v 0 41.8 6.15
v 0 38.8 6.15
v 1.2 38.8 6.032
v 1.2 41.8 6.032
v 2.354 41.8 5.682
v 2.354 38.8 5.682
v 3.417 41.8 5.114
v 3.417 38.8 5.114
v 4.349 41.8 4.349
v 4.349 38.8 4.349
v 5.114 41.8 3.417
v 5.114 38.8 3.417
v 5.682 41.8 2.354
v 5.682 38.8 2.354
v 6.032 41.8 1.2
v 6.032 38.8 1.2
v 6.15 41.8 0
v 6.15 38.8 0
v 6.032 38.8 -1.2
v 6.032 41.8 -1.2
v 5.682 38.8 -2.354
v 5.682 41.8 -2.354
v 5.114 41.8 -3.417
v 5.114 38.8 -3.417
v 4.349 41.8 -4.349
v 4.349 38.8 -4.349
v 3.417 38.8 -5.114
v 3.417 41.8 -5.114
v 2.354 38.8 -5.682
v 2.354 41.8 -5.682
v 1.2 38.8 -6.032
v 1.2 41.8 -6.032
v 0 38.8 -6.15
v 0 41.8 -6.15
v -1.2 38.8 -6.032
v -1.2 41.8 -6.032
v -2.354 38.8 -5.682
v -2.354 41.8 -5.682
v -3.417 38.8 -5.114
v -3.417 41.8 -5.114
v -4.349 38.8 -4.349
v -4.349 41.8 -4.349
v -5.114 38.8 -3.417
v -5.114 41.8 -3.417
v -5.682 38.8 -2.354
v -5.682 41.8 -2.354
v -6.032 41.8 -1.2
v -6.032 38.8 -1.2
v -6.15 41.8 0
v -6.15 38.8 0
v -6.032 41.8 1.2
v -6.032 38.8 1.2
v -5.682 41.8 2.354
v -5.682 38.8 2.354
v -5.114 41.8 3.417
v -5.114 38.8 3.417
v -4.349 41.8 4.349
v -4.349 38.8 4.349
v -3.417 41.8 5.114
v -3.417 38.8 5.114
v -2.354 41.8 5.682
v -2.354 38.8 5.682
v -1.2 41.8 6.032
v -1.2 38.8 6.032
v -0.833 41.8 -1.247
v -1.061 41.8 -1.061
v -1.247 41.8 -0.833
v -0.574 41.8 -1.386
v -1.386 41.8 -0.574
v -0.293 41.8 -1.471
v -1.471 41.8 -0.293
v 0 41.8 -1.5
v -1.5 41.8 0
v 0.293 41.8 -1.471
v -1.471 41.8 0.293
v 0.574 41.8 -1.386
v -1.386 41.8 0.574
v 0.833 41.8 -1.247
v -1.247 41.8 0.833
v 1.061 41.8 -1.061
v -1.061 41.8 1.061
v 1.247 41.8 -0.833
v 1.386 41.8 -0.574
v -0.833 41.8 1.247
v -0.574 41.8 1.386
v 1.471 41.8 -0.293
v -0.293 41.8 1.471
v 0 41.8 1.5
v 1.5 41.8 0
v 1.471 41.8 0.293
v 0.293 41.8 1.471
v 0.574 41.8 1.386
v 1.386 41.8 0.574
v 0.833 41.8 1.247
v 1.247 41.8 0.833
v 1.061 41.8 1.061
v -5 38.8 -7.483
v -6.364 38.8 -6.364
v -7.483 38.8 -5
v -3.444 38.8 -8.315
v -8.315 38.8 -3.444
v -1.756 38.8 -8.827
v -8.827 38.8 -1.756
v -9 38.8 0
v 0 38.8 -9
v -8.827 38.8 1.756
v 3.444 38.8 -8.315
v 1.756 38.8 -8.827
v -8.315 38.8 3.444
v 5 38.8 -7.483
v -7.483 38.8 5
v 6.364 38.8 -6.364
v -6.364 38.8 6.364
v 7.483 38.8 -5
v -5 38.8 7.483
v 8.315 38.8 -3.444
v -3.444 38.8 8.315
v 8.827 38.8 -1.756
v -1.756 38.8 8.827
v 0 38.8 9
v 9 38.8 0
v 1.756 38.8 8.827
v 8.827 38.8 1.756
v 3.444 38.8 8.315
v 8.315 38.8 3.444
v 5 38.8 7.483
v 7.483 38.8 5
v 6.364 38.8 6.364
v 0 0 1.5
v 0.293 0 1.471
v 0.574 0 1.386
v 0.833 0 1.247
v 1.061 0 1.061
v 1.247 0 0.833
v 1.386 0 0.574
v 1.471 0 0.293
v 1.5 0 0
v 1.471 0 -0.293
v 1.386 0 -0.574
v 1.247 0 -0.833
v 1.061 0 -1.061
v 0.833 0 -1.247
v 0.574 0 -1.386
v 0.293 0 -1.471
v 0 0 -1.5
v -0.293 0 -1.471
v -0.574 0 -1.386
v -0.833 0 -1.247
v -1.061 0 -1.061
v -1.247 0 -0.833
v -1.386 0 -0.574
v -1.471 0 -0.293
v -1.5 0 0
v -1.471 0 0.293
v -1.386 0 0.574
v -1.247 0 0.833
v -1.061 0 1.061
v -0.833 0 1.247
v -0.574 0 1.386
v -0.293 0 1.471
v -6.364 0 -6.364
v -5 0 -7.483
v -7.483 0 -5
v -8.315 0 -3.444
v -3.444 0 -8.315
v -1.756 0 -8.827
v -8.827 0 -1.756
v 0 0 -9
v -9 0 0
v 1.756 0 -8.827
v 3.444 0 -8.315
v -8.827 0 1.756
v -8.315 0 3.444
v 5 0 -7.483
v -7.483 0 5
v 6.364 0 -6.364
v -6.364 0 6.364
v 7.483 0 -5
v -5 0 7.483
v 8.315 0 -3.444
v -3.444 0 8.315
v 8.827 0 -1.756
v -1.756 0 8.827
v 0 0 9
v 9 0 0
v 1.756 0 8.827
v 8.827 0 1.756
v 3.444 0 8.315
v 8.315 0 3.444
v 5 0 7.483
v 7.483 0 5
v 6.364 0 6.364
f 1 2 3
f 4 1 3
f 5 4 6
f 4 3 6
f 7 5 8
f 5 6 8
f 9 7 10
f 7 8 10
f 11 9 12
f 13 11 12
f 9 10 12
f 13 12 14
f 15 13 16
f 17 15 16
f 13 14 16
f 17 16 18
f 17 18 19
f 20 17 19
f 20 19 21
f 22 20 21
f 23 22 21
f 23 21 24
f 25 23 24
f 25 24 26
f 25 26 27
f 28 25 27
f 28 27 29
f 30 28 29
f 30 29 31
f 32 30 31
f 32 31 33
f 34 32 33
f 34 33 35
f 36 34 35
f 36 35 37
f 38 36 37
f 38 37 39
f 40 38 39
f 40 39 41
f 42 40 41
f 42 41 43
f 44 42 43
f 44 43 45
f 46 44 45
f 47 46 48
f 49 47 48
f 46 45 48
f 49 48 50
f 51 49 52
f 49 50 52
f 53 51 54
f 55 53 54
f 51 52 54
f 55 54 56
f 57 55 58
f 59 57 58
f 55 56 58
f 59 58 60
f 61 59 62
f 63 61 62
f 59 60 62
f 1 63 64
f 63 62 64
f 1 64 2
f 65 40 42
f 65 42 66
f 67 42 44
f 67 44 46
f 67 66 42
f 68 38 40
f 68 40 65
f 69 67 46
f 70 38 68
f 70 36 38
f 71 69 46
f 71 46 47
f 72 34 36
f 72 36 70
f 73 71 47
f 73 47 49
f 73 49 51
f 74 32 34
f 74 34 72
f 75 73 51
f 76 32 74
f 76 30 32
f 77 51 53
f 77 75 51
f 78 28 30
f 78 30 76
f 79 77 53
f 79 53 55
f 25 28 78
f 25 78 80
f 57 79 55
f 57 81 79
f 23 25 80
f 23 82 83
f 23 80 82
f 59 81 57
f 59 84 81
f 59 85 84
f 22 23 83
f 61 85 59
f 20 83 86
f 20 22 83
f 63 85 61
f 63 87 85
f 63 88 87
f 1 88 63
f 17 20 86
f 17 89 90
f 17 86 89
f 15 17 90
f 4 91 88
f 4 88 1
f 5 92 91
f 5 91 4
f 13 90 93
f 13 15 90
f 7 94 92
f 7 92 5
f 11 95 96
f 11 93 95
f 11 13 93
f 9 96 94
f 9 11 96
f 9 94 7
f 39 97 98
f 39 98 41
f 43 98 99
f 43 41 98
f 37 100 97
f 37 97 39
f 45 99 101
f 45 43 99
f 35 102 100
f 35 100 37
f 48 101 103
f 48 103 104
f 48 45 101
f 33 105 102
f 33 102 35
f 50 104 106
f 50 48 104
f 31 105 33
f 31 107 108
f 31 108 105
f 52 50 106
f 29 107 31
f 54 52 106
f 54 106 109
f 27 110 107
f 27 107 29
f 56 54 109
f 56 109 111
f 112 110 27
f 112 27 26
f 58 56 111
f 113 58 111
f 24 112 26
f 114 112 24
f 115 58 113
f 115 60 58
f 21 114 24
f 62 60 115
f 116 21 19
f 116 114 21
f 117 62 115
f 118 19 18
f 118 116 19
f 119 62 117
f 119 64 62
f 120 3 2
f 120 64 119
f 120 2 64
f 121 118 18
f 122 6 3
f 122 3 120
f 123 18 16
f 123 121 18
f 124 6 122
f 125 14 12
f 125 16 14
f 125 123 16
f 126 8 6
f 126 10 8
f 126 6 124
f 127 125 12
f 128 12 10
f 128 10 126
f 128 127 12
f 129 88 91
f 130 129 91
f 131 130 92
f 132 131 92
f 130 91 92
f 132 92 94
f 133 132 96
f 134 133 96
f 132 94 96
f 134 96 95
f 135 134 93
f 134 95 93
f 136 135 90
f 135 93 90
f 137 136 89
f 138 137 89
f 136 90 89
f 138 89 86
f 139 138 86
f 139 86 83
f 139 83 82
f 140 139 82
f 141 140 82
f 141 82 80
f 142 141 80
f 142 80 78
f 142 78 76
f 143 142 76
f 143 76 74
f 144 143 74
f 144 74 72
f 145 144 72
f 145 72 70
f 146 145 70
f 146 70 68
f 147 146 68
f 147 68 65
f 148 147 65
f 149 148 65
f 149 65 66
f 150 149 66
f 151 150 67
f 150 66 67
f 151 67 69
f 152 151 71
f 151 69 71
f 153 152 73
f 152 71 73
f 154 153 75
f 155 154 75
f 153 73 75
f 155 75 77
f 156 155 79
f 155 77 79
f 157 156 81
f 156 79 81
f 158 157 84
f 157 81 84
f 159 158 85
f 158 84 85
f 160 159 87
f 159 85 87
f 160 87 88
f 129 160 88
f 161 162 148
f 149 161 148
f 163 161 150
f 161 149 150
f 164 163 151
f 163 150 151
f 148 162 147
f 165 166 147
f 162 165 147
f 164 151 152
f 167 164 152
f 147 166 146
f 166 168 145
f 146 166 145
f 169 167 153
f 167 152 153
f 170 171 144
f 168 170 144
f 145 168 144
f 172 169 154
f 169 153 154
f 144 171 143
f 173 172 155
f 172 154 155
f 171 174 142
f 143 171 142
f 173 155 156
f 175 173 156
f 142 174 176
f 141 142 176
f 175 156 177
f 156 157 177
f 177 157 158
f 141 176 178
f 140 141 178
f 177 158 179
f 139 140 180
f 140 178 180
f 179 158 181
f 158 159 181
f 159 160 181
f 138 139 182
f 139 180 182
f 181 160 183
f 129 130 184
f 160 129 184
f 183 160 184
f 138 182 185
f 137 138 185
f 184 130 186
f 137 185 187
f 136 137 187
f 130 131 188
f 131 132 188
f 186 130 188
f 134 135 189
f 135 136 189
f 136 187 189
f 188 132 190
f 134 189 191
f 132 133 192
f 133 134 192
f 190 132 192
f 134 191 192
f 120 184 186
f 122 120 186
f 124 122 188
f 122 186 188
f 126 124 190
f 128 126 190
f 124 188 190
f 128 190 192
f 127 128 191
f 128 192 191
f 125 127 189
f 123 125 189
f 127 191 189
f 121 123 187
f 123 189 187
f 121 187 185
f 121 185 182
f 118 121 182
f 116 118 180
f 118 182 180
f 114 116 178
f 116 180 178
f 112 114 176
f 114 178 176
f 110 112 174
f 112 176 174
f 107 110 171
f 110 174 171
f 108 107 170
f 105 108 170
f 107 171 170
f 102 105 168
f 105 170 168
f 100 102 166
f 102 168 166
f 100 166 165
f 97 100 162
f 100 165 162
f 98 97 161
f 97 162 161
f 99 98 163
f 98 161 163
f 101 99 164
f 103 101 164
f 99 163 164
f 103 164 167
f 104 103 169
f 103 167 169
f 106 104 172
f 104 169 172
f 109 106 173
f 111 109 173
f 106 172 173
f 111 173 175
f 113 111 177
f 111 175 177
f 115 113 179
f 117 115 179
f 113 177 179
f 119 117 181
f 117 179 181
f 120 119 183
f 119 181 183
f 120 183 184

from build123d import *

# Parameters (mm, degrees)
ESBO_O1_R                = 9
ESBO_O1_R_2              = 6.15
RESSALTO_EXTRUS_O1_DEPTH = 38.8
ESBO_O1_2_R              = 6.15
RESSALTO_EXTRUS_O2_DEPTH = 41.8
ESBO_O2_R                = 1.5
CORTE_EXTRUS_O1_DEPTH    = 44.694850955


with BuildPart() as part:
    # Esboço1 → Ressalto-extrusão1 (new body)
    with BuildSketch(Plane(origin=(0, 0, 0), x_dir=(1, 0, 0), z_dir=(0, 1, 0))):
        Circle(ESBO_O1_R)
        Circle(ESBO_O1_R_2, mode=Mode.SUBTRACT)
    extrude(amount=RESSALTO_EXTRUS_O1_DEPTH)

    # Esboço1<2> → Ressalto-extrusão2 (add)
    with BuildSketch(Plane(origin=(0, 0, 0), x_dir=(1, 0, 0), z_dir=(0, 1, 0))):
        Circle(ESBO_O1_2_R)
    extrude(amount=RESSALTO_EXTRUS_O2_DEPTH)

    # Esboço2 → Corte-extrusão1 (cut, through all)
    with BuildSketch(Plane(origin=(0, 41.8, 0), x_dir=(1, 0, 0), z_dir=(0, 1, 0))):
        Circle(ESBO_O2_R)
    extrude(amount=-CORTE_EXTRUS_O1_DEPTH, mode=Mode.SUBTRACT)


solid = part.part
